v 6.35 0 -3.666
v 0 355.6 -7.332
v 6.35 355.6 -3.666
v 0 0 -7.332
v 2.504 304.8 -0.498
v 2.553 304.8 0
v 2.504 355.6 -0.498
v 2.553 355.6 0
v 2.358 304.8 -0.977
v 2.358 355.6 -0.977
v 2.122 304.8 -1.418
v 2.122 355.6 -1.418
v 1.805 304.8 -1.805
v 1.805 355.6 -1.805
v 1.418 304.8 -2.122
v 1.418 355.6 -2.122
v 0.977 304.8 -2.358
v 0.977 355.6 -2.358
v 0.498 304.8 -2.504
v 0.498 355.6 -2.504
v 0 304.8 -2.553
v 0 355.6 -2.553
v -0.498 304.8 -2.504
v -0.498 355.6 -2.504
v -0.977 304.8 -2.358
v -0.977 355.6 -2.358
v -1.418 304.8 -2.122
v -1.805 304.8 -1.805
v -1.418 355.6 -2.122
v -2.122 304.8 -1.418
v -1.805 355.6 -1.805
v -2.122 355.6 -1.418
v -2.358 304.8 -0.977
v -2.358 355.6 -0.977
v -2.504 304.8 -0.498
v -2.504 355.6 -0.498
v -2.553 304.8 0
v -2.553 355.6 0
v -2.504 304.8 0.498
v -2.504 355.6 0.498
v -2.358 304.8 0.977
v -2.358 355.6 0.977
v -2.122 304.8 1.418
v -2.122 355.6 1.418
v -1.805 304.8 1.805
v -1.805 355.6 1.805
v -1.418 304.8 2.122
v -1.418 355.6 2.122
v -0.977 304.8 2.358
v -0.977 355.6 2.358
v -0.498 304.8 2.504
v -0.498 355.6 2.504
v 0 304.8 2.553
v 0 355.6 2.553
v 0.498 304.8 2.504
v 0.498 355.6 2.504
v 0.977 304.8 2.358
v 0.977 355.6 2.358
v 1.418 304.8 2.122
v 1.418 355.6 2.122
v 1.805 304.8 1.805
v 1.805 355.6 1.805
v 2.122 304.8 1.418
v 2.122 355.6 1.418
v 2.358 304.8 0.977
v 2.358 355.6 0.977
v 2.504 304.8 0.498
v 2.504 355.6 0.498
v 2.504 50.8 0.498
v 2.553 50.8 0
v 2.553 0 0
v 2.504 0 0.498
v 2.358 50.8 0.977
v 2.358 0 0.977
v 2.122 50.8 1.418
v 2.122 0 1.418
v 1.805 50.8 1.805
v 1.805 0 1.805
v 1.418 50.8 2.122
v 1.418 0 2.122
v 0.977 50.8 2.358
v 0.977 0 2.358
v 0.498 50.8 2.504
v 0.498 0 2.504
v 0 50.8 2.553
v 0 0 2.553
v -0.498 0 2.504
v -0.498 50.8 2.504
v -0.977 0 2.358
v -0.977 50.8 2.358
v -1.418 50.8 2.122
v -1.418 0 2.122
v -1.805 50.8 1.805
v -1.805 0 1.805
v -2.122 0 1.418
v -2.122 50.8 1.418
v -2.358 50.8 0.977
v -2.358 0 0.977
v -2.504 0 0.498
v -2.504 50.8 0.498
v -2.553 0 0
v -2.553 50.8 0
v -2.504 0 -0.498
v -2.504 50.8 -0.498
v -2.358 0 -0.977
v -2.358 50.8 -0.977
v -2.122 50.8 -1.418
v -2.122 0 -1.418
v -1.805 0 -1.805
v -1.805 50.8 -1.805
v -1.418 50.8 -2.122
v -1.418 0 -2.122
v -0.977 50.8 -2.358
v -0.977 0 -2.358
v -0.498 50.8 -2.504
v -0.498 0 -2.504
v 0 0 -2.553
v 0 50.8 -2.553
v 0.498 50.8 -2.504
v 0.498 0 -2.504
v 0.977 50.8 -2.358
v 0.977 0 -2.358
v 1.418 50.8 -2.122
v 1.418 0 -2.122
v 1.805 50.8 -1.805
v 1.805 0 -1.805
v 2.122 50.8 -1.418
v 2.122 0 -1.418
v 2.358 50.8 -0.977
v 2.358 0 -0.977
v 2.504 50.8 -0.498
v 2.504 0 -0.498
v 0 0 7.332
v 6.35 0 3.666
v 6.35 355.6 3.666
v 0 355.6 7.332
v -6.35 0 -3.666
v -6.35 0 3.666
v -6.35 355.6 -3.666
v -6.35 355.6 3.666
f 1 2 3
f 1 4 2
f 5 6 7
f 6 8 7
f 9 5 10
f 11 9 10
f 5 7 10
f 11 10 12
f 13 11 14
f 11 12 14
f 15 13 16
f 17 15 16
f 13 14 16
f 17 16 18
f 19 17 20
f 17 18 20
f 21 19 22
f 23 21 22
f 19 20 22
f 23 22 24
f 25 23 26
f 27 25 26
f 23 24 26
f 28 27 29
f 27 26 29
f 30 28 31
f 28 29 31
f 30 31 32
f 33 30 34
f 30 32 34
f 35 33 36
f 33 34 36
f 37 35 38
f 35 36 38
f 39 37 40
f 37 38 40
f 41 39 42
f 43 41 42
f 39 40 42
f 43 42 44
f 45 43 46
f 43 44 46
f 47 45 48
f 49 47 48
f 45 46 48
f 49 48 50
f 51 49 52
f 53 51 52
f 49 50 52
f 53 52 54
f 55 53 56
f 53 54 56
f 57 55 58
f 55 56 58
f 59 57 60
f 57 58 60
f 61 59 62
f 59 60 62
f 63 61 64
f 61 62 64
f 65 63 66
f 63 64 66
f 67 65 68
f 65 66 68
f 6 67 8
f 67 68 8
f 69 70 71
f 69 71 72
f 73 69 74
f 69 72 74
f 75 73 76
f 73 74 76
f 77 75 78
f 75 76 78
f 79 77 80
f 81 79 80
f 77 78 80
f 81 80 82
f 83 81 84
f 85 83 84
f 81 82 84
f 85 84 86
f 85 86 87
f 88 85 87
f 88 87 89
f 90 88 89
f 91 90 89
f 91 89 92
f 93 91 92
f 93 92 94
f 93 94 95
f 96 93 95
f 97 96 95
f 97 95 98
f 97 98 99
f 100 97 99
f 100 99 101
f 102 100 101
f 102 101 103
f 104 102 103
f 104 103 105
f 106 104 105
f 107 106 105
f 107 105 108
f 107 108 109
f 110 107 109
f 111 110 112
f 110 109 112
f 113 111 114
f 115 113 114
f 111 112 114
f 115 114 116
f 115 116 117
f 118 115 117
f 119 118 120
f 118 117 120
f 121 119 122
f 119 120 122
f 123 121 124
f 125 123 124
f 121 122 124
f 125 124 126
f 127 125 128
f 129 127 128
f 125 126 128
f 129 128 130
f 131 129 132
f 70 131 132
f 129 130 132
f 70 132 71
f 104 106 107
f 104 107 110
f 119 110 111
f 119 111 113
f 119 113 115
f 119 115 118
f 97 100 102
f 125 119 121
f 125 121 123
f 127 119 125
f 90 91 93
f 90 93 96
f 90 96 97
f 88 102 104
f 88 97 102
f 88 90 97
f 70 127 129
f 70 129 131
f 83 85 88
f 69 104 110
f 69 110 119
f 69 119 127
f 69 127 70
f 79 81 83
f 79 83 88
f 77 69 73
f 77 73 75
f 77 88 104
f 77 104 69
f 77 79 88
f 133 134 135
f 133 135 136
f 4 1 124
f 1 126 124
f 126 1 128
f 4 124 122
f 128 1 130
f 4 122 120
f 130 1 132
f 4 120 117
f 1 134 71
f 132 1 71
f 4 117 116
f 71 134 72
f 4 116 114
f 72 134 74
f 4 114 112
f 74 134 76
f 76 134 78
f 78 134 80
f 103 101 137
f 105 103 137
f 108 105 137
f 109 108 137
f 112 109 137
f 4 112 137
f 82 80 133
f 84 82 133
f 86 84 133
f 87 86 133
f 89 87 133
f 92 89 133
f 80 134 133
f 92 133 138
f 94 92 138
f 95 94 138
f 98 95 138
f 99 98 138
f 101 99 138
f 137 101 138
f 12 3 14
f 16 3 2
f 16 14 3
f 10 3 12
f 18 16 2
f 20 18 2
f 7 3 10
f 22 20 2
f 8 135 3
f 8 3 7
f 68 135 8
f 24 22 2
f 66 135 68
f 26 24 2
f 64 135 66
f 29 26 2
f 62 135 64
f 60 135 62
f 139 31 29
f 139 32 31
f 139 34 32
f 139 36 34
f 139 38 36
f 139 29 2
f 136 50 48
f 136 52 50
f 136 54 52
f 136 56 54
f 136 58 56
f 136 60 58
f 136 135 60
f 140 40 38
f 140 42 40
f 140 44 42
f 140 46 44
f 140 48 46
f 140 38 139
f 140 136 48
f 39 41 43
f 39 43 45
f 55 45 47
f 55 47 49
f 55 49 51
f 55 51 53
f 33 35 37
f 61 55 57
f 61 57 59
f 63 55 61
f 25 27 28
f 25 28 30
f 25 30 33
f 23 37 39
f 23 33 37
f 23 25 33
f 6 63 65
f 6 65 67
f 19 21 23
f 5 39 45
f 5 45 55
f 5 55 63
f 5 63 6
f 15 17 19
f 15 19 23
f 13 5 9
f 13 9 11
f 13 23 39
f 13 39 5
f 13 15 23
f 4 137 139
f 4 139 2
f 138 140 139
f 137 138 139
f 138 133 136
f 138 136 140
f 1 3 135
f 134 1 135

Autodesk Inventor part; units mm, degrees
ref_plane "YZ Plane" through (0, 0, 0) normal (1, 0, 0) x (0, 1, 0)
ref_plane "XZ Plane" through (0, 0, 0) normal (0, 1, 0) x (-1, 0, 0)
ref_plane "XY Plane" through (0, 0, 0) normal (0, 0, 1) x (1, 0, 0)
sketch "Sketch1" plane through (0, 0, 0) normal (0, 1, 0) x (-1, 0, 0)
  line L0 (6.35, 3.6662) -> (6.35, -3.6662)
  line L1 (6.35, -3.6662) -> (0, -7.3323)
  line L2 (0, -7.3323) -> (-6.35, -3.6662)
  line L3 (-6.35, -3.6662) -> (-6.35, 3.6662)
  line L4 (-6.35, 3.6662) -> (0, 7.3323)
  line L5 (0, 7.3323) -> (6.35, 3.6662)
  point P0 (0, 0)
  point P1 (0, 0)
  point P2 (-6.35, 0)
  dimension "d0" = 12.7
extrude "Extrusion1" add sketch "Sketch1" along normal blind 355.6
sketch "Sketch2" plane through (0, 355.6, 0) normal (0, 1, 0) x (1, 0, 0)
  circle A0 centre (0, 0) radius 2.5527
  dimension "d3" = 5.1054
extrude "Extrusion2" cut sketch "Sketch2" against normal blind 50.8
sketch "Sketch3" plane through (0, 0, 0) normal (0, -1, 0) x (1, 0, 0)
  circle A0 centre (0, 0) radius 2.5527 projected
  circle A1 centre (0, 0) radius 2.5527
extrude "Extrusion3" cut sketch "Sketch3" against normal blind 50.8
thread "Thread1" size "1/4-20 UNC" class "2B" standard "ANSI Unified Screw Threads" full length
properties part number "CORL_014_Shaft" material "Aluminum 6061"
